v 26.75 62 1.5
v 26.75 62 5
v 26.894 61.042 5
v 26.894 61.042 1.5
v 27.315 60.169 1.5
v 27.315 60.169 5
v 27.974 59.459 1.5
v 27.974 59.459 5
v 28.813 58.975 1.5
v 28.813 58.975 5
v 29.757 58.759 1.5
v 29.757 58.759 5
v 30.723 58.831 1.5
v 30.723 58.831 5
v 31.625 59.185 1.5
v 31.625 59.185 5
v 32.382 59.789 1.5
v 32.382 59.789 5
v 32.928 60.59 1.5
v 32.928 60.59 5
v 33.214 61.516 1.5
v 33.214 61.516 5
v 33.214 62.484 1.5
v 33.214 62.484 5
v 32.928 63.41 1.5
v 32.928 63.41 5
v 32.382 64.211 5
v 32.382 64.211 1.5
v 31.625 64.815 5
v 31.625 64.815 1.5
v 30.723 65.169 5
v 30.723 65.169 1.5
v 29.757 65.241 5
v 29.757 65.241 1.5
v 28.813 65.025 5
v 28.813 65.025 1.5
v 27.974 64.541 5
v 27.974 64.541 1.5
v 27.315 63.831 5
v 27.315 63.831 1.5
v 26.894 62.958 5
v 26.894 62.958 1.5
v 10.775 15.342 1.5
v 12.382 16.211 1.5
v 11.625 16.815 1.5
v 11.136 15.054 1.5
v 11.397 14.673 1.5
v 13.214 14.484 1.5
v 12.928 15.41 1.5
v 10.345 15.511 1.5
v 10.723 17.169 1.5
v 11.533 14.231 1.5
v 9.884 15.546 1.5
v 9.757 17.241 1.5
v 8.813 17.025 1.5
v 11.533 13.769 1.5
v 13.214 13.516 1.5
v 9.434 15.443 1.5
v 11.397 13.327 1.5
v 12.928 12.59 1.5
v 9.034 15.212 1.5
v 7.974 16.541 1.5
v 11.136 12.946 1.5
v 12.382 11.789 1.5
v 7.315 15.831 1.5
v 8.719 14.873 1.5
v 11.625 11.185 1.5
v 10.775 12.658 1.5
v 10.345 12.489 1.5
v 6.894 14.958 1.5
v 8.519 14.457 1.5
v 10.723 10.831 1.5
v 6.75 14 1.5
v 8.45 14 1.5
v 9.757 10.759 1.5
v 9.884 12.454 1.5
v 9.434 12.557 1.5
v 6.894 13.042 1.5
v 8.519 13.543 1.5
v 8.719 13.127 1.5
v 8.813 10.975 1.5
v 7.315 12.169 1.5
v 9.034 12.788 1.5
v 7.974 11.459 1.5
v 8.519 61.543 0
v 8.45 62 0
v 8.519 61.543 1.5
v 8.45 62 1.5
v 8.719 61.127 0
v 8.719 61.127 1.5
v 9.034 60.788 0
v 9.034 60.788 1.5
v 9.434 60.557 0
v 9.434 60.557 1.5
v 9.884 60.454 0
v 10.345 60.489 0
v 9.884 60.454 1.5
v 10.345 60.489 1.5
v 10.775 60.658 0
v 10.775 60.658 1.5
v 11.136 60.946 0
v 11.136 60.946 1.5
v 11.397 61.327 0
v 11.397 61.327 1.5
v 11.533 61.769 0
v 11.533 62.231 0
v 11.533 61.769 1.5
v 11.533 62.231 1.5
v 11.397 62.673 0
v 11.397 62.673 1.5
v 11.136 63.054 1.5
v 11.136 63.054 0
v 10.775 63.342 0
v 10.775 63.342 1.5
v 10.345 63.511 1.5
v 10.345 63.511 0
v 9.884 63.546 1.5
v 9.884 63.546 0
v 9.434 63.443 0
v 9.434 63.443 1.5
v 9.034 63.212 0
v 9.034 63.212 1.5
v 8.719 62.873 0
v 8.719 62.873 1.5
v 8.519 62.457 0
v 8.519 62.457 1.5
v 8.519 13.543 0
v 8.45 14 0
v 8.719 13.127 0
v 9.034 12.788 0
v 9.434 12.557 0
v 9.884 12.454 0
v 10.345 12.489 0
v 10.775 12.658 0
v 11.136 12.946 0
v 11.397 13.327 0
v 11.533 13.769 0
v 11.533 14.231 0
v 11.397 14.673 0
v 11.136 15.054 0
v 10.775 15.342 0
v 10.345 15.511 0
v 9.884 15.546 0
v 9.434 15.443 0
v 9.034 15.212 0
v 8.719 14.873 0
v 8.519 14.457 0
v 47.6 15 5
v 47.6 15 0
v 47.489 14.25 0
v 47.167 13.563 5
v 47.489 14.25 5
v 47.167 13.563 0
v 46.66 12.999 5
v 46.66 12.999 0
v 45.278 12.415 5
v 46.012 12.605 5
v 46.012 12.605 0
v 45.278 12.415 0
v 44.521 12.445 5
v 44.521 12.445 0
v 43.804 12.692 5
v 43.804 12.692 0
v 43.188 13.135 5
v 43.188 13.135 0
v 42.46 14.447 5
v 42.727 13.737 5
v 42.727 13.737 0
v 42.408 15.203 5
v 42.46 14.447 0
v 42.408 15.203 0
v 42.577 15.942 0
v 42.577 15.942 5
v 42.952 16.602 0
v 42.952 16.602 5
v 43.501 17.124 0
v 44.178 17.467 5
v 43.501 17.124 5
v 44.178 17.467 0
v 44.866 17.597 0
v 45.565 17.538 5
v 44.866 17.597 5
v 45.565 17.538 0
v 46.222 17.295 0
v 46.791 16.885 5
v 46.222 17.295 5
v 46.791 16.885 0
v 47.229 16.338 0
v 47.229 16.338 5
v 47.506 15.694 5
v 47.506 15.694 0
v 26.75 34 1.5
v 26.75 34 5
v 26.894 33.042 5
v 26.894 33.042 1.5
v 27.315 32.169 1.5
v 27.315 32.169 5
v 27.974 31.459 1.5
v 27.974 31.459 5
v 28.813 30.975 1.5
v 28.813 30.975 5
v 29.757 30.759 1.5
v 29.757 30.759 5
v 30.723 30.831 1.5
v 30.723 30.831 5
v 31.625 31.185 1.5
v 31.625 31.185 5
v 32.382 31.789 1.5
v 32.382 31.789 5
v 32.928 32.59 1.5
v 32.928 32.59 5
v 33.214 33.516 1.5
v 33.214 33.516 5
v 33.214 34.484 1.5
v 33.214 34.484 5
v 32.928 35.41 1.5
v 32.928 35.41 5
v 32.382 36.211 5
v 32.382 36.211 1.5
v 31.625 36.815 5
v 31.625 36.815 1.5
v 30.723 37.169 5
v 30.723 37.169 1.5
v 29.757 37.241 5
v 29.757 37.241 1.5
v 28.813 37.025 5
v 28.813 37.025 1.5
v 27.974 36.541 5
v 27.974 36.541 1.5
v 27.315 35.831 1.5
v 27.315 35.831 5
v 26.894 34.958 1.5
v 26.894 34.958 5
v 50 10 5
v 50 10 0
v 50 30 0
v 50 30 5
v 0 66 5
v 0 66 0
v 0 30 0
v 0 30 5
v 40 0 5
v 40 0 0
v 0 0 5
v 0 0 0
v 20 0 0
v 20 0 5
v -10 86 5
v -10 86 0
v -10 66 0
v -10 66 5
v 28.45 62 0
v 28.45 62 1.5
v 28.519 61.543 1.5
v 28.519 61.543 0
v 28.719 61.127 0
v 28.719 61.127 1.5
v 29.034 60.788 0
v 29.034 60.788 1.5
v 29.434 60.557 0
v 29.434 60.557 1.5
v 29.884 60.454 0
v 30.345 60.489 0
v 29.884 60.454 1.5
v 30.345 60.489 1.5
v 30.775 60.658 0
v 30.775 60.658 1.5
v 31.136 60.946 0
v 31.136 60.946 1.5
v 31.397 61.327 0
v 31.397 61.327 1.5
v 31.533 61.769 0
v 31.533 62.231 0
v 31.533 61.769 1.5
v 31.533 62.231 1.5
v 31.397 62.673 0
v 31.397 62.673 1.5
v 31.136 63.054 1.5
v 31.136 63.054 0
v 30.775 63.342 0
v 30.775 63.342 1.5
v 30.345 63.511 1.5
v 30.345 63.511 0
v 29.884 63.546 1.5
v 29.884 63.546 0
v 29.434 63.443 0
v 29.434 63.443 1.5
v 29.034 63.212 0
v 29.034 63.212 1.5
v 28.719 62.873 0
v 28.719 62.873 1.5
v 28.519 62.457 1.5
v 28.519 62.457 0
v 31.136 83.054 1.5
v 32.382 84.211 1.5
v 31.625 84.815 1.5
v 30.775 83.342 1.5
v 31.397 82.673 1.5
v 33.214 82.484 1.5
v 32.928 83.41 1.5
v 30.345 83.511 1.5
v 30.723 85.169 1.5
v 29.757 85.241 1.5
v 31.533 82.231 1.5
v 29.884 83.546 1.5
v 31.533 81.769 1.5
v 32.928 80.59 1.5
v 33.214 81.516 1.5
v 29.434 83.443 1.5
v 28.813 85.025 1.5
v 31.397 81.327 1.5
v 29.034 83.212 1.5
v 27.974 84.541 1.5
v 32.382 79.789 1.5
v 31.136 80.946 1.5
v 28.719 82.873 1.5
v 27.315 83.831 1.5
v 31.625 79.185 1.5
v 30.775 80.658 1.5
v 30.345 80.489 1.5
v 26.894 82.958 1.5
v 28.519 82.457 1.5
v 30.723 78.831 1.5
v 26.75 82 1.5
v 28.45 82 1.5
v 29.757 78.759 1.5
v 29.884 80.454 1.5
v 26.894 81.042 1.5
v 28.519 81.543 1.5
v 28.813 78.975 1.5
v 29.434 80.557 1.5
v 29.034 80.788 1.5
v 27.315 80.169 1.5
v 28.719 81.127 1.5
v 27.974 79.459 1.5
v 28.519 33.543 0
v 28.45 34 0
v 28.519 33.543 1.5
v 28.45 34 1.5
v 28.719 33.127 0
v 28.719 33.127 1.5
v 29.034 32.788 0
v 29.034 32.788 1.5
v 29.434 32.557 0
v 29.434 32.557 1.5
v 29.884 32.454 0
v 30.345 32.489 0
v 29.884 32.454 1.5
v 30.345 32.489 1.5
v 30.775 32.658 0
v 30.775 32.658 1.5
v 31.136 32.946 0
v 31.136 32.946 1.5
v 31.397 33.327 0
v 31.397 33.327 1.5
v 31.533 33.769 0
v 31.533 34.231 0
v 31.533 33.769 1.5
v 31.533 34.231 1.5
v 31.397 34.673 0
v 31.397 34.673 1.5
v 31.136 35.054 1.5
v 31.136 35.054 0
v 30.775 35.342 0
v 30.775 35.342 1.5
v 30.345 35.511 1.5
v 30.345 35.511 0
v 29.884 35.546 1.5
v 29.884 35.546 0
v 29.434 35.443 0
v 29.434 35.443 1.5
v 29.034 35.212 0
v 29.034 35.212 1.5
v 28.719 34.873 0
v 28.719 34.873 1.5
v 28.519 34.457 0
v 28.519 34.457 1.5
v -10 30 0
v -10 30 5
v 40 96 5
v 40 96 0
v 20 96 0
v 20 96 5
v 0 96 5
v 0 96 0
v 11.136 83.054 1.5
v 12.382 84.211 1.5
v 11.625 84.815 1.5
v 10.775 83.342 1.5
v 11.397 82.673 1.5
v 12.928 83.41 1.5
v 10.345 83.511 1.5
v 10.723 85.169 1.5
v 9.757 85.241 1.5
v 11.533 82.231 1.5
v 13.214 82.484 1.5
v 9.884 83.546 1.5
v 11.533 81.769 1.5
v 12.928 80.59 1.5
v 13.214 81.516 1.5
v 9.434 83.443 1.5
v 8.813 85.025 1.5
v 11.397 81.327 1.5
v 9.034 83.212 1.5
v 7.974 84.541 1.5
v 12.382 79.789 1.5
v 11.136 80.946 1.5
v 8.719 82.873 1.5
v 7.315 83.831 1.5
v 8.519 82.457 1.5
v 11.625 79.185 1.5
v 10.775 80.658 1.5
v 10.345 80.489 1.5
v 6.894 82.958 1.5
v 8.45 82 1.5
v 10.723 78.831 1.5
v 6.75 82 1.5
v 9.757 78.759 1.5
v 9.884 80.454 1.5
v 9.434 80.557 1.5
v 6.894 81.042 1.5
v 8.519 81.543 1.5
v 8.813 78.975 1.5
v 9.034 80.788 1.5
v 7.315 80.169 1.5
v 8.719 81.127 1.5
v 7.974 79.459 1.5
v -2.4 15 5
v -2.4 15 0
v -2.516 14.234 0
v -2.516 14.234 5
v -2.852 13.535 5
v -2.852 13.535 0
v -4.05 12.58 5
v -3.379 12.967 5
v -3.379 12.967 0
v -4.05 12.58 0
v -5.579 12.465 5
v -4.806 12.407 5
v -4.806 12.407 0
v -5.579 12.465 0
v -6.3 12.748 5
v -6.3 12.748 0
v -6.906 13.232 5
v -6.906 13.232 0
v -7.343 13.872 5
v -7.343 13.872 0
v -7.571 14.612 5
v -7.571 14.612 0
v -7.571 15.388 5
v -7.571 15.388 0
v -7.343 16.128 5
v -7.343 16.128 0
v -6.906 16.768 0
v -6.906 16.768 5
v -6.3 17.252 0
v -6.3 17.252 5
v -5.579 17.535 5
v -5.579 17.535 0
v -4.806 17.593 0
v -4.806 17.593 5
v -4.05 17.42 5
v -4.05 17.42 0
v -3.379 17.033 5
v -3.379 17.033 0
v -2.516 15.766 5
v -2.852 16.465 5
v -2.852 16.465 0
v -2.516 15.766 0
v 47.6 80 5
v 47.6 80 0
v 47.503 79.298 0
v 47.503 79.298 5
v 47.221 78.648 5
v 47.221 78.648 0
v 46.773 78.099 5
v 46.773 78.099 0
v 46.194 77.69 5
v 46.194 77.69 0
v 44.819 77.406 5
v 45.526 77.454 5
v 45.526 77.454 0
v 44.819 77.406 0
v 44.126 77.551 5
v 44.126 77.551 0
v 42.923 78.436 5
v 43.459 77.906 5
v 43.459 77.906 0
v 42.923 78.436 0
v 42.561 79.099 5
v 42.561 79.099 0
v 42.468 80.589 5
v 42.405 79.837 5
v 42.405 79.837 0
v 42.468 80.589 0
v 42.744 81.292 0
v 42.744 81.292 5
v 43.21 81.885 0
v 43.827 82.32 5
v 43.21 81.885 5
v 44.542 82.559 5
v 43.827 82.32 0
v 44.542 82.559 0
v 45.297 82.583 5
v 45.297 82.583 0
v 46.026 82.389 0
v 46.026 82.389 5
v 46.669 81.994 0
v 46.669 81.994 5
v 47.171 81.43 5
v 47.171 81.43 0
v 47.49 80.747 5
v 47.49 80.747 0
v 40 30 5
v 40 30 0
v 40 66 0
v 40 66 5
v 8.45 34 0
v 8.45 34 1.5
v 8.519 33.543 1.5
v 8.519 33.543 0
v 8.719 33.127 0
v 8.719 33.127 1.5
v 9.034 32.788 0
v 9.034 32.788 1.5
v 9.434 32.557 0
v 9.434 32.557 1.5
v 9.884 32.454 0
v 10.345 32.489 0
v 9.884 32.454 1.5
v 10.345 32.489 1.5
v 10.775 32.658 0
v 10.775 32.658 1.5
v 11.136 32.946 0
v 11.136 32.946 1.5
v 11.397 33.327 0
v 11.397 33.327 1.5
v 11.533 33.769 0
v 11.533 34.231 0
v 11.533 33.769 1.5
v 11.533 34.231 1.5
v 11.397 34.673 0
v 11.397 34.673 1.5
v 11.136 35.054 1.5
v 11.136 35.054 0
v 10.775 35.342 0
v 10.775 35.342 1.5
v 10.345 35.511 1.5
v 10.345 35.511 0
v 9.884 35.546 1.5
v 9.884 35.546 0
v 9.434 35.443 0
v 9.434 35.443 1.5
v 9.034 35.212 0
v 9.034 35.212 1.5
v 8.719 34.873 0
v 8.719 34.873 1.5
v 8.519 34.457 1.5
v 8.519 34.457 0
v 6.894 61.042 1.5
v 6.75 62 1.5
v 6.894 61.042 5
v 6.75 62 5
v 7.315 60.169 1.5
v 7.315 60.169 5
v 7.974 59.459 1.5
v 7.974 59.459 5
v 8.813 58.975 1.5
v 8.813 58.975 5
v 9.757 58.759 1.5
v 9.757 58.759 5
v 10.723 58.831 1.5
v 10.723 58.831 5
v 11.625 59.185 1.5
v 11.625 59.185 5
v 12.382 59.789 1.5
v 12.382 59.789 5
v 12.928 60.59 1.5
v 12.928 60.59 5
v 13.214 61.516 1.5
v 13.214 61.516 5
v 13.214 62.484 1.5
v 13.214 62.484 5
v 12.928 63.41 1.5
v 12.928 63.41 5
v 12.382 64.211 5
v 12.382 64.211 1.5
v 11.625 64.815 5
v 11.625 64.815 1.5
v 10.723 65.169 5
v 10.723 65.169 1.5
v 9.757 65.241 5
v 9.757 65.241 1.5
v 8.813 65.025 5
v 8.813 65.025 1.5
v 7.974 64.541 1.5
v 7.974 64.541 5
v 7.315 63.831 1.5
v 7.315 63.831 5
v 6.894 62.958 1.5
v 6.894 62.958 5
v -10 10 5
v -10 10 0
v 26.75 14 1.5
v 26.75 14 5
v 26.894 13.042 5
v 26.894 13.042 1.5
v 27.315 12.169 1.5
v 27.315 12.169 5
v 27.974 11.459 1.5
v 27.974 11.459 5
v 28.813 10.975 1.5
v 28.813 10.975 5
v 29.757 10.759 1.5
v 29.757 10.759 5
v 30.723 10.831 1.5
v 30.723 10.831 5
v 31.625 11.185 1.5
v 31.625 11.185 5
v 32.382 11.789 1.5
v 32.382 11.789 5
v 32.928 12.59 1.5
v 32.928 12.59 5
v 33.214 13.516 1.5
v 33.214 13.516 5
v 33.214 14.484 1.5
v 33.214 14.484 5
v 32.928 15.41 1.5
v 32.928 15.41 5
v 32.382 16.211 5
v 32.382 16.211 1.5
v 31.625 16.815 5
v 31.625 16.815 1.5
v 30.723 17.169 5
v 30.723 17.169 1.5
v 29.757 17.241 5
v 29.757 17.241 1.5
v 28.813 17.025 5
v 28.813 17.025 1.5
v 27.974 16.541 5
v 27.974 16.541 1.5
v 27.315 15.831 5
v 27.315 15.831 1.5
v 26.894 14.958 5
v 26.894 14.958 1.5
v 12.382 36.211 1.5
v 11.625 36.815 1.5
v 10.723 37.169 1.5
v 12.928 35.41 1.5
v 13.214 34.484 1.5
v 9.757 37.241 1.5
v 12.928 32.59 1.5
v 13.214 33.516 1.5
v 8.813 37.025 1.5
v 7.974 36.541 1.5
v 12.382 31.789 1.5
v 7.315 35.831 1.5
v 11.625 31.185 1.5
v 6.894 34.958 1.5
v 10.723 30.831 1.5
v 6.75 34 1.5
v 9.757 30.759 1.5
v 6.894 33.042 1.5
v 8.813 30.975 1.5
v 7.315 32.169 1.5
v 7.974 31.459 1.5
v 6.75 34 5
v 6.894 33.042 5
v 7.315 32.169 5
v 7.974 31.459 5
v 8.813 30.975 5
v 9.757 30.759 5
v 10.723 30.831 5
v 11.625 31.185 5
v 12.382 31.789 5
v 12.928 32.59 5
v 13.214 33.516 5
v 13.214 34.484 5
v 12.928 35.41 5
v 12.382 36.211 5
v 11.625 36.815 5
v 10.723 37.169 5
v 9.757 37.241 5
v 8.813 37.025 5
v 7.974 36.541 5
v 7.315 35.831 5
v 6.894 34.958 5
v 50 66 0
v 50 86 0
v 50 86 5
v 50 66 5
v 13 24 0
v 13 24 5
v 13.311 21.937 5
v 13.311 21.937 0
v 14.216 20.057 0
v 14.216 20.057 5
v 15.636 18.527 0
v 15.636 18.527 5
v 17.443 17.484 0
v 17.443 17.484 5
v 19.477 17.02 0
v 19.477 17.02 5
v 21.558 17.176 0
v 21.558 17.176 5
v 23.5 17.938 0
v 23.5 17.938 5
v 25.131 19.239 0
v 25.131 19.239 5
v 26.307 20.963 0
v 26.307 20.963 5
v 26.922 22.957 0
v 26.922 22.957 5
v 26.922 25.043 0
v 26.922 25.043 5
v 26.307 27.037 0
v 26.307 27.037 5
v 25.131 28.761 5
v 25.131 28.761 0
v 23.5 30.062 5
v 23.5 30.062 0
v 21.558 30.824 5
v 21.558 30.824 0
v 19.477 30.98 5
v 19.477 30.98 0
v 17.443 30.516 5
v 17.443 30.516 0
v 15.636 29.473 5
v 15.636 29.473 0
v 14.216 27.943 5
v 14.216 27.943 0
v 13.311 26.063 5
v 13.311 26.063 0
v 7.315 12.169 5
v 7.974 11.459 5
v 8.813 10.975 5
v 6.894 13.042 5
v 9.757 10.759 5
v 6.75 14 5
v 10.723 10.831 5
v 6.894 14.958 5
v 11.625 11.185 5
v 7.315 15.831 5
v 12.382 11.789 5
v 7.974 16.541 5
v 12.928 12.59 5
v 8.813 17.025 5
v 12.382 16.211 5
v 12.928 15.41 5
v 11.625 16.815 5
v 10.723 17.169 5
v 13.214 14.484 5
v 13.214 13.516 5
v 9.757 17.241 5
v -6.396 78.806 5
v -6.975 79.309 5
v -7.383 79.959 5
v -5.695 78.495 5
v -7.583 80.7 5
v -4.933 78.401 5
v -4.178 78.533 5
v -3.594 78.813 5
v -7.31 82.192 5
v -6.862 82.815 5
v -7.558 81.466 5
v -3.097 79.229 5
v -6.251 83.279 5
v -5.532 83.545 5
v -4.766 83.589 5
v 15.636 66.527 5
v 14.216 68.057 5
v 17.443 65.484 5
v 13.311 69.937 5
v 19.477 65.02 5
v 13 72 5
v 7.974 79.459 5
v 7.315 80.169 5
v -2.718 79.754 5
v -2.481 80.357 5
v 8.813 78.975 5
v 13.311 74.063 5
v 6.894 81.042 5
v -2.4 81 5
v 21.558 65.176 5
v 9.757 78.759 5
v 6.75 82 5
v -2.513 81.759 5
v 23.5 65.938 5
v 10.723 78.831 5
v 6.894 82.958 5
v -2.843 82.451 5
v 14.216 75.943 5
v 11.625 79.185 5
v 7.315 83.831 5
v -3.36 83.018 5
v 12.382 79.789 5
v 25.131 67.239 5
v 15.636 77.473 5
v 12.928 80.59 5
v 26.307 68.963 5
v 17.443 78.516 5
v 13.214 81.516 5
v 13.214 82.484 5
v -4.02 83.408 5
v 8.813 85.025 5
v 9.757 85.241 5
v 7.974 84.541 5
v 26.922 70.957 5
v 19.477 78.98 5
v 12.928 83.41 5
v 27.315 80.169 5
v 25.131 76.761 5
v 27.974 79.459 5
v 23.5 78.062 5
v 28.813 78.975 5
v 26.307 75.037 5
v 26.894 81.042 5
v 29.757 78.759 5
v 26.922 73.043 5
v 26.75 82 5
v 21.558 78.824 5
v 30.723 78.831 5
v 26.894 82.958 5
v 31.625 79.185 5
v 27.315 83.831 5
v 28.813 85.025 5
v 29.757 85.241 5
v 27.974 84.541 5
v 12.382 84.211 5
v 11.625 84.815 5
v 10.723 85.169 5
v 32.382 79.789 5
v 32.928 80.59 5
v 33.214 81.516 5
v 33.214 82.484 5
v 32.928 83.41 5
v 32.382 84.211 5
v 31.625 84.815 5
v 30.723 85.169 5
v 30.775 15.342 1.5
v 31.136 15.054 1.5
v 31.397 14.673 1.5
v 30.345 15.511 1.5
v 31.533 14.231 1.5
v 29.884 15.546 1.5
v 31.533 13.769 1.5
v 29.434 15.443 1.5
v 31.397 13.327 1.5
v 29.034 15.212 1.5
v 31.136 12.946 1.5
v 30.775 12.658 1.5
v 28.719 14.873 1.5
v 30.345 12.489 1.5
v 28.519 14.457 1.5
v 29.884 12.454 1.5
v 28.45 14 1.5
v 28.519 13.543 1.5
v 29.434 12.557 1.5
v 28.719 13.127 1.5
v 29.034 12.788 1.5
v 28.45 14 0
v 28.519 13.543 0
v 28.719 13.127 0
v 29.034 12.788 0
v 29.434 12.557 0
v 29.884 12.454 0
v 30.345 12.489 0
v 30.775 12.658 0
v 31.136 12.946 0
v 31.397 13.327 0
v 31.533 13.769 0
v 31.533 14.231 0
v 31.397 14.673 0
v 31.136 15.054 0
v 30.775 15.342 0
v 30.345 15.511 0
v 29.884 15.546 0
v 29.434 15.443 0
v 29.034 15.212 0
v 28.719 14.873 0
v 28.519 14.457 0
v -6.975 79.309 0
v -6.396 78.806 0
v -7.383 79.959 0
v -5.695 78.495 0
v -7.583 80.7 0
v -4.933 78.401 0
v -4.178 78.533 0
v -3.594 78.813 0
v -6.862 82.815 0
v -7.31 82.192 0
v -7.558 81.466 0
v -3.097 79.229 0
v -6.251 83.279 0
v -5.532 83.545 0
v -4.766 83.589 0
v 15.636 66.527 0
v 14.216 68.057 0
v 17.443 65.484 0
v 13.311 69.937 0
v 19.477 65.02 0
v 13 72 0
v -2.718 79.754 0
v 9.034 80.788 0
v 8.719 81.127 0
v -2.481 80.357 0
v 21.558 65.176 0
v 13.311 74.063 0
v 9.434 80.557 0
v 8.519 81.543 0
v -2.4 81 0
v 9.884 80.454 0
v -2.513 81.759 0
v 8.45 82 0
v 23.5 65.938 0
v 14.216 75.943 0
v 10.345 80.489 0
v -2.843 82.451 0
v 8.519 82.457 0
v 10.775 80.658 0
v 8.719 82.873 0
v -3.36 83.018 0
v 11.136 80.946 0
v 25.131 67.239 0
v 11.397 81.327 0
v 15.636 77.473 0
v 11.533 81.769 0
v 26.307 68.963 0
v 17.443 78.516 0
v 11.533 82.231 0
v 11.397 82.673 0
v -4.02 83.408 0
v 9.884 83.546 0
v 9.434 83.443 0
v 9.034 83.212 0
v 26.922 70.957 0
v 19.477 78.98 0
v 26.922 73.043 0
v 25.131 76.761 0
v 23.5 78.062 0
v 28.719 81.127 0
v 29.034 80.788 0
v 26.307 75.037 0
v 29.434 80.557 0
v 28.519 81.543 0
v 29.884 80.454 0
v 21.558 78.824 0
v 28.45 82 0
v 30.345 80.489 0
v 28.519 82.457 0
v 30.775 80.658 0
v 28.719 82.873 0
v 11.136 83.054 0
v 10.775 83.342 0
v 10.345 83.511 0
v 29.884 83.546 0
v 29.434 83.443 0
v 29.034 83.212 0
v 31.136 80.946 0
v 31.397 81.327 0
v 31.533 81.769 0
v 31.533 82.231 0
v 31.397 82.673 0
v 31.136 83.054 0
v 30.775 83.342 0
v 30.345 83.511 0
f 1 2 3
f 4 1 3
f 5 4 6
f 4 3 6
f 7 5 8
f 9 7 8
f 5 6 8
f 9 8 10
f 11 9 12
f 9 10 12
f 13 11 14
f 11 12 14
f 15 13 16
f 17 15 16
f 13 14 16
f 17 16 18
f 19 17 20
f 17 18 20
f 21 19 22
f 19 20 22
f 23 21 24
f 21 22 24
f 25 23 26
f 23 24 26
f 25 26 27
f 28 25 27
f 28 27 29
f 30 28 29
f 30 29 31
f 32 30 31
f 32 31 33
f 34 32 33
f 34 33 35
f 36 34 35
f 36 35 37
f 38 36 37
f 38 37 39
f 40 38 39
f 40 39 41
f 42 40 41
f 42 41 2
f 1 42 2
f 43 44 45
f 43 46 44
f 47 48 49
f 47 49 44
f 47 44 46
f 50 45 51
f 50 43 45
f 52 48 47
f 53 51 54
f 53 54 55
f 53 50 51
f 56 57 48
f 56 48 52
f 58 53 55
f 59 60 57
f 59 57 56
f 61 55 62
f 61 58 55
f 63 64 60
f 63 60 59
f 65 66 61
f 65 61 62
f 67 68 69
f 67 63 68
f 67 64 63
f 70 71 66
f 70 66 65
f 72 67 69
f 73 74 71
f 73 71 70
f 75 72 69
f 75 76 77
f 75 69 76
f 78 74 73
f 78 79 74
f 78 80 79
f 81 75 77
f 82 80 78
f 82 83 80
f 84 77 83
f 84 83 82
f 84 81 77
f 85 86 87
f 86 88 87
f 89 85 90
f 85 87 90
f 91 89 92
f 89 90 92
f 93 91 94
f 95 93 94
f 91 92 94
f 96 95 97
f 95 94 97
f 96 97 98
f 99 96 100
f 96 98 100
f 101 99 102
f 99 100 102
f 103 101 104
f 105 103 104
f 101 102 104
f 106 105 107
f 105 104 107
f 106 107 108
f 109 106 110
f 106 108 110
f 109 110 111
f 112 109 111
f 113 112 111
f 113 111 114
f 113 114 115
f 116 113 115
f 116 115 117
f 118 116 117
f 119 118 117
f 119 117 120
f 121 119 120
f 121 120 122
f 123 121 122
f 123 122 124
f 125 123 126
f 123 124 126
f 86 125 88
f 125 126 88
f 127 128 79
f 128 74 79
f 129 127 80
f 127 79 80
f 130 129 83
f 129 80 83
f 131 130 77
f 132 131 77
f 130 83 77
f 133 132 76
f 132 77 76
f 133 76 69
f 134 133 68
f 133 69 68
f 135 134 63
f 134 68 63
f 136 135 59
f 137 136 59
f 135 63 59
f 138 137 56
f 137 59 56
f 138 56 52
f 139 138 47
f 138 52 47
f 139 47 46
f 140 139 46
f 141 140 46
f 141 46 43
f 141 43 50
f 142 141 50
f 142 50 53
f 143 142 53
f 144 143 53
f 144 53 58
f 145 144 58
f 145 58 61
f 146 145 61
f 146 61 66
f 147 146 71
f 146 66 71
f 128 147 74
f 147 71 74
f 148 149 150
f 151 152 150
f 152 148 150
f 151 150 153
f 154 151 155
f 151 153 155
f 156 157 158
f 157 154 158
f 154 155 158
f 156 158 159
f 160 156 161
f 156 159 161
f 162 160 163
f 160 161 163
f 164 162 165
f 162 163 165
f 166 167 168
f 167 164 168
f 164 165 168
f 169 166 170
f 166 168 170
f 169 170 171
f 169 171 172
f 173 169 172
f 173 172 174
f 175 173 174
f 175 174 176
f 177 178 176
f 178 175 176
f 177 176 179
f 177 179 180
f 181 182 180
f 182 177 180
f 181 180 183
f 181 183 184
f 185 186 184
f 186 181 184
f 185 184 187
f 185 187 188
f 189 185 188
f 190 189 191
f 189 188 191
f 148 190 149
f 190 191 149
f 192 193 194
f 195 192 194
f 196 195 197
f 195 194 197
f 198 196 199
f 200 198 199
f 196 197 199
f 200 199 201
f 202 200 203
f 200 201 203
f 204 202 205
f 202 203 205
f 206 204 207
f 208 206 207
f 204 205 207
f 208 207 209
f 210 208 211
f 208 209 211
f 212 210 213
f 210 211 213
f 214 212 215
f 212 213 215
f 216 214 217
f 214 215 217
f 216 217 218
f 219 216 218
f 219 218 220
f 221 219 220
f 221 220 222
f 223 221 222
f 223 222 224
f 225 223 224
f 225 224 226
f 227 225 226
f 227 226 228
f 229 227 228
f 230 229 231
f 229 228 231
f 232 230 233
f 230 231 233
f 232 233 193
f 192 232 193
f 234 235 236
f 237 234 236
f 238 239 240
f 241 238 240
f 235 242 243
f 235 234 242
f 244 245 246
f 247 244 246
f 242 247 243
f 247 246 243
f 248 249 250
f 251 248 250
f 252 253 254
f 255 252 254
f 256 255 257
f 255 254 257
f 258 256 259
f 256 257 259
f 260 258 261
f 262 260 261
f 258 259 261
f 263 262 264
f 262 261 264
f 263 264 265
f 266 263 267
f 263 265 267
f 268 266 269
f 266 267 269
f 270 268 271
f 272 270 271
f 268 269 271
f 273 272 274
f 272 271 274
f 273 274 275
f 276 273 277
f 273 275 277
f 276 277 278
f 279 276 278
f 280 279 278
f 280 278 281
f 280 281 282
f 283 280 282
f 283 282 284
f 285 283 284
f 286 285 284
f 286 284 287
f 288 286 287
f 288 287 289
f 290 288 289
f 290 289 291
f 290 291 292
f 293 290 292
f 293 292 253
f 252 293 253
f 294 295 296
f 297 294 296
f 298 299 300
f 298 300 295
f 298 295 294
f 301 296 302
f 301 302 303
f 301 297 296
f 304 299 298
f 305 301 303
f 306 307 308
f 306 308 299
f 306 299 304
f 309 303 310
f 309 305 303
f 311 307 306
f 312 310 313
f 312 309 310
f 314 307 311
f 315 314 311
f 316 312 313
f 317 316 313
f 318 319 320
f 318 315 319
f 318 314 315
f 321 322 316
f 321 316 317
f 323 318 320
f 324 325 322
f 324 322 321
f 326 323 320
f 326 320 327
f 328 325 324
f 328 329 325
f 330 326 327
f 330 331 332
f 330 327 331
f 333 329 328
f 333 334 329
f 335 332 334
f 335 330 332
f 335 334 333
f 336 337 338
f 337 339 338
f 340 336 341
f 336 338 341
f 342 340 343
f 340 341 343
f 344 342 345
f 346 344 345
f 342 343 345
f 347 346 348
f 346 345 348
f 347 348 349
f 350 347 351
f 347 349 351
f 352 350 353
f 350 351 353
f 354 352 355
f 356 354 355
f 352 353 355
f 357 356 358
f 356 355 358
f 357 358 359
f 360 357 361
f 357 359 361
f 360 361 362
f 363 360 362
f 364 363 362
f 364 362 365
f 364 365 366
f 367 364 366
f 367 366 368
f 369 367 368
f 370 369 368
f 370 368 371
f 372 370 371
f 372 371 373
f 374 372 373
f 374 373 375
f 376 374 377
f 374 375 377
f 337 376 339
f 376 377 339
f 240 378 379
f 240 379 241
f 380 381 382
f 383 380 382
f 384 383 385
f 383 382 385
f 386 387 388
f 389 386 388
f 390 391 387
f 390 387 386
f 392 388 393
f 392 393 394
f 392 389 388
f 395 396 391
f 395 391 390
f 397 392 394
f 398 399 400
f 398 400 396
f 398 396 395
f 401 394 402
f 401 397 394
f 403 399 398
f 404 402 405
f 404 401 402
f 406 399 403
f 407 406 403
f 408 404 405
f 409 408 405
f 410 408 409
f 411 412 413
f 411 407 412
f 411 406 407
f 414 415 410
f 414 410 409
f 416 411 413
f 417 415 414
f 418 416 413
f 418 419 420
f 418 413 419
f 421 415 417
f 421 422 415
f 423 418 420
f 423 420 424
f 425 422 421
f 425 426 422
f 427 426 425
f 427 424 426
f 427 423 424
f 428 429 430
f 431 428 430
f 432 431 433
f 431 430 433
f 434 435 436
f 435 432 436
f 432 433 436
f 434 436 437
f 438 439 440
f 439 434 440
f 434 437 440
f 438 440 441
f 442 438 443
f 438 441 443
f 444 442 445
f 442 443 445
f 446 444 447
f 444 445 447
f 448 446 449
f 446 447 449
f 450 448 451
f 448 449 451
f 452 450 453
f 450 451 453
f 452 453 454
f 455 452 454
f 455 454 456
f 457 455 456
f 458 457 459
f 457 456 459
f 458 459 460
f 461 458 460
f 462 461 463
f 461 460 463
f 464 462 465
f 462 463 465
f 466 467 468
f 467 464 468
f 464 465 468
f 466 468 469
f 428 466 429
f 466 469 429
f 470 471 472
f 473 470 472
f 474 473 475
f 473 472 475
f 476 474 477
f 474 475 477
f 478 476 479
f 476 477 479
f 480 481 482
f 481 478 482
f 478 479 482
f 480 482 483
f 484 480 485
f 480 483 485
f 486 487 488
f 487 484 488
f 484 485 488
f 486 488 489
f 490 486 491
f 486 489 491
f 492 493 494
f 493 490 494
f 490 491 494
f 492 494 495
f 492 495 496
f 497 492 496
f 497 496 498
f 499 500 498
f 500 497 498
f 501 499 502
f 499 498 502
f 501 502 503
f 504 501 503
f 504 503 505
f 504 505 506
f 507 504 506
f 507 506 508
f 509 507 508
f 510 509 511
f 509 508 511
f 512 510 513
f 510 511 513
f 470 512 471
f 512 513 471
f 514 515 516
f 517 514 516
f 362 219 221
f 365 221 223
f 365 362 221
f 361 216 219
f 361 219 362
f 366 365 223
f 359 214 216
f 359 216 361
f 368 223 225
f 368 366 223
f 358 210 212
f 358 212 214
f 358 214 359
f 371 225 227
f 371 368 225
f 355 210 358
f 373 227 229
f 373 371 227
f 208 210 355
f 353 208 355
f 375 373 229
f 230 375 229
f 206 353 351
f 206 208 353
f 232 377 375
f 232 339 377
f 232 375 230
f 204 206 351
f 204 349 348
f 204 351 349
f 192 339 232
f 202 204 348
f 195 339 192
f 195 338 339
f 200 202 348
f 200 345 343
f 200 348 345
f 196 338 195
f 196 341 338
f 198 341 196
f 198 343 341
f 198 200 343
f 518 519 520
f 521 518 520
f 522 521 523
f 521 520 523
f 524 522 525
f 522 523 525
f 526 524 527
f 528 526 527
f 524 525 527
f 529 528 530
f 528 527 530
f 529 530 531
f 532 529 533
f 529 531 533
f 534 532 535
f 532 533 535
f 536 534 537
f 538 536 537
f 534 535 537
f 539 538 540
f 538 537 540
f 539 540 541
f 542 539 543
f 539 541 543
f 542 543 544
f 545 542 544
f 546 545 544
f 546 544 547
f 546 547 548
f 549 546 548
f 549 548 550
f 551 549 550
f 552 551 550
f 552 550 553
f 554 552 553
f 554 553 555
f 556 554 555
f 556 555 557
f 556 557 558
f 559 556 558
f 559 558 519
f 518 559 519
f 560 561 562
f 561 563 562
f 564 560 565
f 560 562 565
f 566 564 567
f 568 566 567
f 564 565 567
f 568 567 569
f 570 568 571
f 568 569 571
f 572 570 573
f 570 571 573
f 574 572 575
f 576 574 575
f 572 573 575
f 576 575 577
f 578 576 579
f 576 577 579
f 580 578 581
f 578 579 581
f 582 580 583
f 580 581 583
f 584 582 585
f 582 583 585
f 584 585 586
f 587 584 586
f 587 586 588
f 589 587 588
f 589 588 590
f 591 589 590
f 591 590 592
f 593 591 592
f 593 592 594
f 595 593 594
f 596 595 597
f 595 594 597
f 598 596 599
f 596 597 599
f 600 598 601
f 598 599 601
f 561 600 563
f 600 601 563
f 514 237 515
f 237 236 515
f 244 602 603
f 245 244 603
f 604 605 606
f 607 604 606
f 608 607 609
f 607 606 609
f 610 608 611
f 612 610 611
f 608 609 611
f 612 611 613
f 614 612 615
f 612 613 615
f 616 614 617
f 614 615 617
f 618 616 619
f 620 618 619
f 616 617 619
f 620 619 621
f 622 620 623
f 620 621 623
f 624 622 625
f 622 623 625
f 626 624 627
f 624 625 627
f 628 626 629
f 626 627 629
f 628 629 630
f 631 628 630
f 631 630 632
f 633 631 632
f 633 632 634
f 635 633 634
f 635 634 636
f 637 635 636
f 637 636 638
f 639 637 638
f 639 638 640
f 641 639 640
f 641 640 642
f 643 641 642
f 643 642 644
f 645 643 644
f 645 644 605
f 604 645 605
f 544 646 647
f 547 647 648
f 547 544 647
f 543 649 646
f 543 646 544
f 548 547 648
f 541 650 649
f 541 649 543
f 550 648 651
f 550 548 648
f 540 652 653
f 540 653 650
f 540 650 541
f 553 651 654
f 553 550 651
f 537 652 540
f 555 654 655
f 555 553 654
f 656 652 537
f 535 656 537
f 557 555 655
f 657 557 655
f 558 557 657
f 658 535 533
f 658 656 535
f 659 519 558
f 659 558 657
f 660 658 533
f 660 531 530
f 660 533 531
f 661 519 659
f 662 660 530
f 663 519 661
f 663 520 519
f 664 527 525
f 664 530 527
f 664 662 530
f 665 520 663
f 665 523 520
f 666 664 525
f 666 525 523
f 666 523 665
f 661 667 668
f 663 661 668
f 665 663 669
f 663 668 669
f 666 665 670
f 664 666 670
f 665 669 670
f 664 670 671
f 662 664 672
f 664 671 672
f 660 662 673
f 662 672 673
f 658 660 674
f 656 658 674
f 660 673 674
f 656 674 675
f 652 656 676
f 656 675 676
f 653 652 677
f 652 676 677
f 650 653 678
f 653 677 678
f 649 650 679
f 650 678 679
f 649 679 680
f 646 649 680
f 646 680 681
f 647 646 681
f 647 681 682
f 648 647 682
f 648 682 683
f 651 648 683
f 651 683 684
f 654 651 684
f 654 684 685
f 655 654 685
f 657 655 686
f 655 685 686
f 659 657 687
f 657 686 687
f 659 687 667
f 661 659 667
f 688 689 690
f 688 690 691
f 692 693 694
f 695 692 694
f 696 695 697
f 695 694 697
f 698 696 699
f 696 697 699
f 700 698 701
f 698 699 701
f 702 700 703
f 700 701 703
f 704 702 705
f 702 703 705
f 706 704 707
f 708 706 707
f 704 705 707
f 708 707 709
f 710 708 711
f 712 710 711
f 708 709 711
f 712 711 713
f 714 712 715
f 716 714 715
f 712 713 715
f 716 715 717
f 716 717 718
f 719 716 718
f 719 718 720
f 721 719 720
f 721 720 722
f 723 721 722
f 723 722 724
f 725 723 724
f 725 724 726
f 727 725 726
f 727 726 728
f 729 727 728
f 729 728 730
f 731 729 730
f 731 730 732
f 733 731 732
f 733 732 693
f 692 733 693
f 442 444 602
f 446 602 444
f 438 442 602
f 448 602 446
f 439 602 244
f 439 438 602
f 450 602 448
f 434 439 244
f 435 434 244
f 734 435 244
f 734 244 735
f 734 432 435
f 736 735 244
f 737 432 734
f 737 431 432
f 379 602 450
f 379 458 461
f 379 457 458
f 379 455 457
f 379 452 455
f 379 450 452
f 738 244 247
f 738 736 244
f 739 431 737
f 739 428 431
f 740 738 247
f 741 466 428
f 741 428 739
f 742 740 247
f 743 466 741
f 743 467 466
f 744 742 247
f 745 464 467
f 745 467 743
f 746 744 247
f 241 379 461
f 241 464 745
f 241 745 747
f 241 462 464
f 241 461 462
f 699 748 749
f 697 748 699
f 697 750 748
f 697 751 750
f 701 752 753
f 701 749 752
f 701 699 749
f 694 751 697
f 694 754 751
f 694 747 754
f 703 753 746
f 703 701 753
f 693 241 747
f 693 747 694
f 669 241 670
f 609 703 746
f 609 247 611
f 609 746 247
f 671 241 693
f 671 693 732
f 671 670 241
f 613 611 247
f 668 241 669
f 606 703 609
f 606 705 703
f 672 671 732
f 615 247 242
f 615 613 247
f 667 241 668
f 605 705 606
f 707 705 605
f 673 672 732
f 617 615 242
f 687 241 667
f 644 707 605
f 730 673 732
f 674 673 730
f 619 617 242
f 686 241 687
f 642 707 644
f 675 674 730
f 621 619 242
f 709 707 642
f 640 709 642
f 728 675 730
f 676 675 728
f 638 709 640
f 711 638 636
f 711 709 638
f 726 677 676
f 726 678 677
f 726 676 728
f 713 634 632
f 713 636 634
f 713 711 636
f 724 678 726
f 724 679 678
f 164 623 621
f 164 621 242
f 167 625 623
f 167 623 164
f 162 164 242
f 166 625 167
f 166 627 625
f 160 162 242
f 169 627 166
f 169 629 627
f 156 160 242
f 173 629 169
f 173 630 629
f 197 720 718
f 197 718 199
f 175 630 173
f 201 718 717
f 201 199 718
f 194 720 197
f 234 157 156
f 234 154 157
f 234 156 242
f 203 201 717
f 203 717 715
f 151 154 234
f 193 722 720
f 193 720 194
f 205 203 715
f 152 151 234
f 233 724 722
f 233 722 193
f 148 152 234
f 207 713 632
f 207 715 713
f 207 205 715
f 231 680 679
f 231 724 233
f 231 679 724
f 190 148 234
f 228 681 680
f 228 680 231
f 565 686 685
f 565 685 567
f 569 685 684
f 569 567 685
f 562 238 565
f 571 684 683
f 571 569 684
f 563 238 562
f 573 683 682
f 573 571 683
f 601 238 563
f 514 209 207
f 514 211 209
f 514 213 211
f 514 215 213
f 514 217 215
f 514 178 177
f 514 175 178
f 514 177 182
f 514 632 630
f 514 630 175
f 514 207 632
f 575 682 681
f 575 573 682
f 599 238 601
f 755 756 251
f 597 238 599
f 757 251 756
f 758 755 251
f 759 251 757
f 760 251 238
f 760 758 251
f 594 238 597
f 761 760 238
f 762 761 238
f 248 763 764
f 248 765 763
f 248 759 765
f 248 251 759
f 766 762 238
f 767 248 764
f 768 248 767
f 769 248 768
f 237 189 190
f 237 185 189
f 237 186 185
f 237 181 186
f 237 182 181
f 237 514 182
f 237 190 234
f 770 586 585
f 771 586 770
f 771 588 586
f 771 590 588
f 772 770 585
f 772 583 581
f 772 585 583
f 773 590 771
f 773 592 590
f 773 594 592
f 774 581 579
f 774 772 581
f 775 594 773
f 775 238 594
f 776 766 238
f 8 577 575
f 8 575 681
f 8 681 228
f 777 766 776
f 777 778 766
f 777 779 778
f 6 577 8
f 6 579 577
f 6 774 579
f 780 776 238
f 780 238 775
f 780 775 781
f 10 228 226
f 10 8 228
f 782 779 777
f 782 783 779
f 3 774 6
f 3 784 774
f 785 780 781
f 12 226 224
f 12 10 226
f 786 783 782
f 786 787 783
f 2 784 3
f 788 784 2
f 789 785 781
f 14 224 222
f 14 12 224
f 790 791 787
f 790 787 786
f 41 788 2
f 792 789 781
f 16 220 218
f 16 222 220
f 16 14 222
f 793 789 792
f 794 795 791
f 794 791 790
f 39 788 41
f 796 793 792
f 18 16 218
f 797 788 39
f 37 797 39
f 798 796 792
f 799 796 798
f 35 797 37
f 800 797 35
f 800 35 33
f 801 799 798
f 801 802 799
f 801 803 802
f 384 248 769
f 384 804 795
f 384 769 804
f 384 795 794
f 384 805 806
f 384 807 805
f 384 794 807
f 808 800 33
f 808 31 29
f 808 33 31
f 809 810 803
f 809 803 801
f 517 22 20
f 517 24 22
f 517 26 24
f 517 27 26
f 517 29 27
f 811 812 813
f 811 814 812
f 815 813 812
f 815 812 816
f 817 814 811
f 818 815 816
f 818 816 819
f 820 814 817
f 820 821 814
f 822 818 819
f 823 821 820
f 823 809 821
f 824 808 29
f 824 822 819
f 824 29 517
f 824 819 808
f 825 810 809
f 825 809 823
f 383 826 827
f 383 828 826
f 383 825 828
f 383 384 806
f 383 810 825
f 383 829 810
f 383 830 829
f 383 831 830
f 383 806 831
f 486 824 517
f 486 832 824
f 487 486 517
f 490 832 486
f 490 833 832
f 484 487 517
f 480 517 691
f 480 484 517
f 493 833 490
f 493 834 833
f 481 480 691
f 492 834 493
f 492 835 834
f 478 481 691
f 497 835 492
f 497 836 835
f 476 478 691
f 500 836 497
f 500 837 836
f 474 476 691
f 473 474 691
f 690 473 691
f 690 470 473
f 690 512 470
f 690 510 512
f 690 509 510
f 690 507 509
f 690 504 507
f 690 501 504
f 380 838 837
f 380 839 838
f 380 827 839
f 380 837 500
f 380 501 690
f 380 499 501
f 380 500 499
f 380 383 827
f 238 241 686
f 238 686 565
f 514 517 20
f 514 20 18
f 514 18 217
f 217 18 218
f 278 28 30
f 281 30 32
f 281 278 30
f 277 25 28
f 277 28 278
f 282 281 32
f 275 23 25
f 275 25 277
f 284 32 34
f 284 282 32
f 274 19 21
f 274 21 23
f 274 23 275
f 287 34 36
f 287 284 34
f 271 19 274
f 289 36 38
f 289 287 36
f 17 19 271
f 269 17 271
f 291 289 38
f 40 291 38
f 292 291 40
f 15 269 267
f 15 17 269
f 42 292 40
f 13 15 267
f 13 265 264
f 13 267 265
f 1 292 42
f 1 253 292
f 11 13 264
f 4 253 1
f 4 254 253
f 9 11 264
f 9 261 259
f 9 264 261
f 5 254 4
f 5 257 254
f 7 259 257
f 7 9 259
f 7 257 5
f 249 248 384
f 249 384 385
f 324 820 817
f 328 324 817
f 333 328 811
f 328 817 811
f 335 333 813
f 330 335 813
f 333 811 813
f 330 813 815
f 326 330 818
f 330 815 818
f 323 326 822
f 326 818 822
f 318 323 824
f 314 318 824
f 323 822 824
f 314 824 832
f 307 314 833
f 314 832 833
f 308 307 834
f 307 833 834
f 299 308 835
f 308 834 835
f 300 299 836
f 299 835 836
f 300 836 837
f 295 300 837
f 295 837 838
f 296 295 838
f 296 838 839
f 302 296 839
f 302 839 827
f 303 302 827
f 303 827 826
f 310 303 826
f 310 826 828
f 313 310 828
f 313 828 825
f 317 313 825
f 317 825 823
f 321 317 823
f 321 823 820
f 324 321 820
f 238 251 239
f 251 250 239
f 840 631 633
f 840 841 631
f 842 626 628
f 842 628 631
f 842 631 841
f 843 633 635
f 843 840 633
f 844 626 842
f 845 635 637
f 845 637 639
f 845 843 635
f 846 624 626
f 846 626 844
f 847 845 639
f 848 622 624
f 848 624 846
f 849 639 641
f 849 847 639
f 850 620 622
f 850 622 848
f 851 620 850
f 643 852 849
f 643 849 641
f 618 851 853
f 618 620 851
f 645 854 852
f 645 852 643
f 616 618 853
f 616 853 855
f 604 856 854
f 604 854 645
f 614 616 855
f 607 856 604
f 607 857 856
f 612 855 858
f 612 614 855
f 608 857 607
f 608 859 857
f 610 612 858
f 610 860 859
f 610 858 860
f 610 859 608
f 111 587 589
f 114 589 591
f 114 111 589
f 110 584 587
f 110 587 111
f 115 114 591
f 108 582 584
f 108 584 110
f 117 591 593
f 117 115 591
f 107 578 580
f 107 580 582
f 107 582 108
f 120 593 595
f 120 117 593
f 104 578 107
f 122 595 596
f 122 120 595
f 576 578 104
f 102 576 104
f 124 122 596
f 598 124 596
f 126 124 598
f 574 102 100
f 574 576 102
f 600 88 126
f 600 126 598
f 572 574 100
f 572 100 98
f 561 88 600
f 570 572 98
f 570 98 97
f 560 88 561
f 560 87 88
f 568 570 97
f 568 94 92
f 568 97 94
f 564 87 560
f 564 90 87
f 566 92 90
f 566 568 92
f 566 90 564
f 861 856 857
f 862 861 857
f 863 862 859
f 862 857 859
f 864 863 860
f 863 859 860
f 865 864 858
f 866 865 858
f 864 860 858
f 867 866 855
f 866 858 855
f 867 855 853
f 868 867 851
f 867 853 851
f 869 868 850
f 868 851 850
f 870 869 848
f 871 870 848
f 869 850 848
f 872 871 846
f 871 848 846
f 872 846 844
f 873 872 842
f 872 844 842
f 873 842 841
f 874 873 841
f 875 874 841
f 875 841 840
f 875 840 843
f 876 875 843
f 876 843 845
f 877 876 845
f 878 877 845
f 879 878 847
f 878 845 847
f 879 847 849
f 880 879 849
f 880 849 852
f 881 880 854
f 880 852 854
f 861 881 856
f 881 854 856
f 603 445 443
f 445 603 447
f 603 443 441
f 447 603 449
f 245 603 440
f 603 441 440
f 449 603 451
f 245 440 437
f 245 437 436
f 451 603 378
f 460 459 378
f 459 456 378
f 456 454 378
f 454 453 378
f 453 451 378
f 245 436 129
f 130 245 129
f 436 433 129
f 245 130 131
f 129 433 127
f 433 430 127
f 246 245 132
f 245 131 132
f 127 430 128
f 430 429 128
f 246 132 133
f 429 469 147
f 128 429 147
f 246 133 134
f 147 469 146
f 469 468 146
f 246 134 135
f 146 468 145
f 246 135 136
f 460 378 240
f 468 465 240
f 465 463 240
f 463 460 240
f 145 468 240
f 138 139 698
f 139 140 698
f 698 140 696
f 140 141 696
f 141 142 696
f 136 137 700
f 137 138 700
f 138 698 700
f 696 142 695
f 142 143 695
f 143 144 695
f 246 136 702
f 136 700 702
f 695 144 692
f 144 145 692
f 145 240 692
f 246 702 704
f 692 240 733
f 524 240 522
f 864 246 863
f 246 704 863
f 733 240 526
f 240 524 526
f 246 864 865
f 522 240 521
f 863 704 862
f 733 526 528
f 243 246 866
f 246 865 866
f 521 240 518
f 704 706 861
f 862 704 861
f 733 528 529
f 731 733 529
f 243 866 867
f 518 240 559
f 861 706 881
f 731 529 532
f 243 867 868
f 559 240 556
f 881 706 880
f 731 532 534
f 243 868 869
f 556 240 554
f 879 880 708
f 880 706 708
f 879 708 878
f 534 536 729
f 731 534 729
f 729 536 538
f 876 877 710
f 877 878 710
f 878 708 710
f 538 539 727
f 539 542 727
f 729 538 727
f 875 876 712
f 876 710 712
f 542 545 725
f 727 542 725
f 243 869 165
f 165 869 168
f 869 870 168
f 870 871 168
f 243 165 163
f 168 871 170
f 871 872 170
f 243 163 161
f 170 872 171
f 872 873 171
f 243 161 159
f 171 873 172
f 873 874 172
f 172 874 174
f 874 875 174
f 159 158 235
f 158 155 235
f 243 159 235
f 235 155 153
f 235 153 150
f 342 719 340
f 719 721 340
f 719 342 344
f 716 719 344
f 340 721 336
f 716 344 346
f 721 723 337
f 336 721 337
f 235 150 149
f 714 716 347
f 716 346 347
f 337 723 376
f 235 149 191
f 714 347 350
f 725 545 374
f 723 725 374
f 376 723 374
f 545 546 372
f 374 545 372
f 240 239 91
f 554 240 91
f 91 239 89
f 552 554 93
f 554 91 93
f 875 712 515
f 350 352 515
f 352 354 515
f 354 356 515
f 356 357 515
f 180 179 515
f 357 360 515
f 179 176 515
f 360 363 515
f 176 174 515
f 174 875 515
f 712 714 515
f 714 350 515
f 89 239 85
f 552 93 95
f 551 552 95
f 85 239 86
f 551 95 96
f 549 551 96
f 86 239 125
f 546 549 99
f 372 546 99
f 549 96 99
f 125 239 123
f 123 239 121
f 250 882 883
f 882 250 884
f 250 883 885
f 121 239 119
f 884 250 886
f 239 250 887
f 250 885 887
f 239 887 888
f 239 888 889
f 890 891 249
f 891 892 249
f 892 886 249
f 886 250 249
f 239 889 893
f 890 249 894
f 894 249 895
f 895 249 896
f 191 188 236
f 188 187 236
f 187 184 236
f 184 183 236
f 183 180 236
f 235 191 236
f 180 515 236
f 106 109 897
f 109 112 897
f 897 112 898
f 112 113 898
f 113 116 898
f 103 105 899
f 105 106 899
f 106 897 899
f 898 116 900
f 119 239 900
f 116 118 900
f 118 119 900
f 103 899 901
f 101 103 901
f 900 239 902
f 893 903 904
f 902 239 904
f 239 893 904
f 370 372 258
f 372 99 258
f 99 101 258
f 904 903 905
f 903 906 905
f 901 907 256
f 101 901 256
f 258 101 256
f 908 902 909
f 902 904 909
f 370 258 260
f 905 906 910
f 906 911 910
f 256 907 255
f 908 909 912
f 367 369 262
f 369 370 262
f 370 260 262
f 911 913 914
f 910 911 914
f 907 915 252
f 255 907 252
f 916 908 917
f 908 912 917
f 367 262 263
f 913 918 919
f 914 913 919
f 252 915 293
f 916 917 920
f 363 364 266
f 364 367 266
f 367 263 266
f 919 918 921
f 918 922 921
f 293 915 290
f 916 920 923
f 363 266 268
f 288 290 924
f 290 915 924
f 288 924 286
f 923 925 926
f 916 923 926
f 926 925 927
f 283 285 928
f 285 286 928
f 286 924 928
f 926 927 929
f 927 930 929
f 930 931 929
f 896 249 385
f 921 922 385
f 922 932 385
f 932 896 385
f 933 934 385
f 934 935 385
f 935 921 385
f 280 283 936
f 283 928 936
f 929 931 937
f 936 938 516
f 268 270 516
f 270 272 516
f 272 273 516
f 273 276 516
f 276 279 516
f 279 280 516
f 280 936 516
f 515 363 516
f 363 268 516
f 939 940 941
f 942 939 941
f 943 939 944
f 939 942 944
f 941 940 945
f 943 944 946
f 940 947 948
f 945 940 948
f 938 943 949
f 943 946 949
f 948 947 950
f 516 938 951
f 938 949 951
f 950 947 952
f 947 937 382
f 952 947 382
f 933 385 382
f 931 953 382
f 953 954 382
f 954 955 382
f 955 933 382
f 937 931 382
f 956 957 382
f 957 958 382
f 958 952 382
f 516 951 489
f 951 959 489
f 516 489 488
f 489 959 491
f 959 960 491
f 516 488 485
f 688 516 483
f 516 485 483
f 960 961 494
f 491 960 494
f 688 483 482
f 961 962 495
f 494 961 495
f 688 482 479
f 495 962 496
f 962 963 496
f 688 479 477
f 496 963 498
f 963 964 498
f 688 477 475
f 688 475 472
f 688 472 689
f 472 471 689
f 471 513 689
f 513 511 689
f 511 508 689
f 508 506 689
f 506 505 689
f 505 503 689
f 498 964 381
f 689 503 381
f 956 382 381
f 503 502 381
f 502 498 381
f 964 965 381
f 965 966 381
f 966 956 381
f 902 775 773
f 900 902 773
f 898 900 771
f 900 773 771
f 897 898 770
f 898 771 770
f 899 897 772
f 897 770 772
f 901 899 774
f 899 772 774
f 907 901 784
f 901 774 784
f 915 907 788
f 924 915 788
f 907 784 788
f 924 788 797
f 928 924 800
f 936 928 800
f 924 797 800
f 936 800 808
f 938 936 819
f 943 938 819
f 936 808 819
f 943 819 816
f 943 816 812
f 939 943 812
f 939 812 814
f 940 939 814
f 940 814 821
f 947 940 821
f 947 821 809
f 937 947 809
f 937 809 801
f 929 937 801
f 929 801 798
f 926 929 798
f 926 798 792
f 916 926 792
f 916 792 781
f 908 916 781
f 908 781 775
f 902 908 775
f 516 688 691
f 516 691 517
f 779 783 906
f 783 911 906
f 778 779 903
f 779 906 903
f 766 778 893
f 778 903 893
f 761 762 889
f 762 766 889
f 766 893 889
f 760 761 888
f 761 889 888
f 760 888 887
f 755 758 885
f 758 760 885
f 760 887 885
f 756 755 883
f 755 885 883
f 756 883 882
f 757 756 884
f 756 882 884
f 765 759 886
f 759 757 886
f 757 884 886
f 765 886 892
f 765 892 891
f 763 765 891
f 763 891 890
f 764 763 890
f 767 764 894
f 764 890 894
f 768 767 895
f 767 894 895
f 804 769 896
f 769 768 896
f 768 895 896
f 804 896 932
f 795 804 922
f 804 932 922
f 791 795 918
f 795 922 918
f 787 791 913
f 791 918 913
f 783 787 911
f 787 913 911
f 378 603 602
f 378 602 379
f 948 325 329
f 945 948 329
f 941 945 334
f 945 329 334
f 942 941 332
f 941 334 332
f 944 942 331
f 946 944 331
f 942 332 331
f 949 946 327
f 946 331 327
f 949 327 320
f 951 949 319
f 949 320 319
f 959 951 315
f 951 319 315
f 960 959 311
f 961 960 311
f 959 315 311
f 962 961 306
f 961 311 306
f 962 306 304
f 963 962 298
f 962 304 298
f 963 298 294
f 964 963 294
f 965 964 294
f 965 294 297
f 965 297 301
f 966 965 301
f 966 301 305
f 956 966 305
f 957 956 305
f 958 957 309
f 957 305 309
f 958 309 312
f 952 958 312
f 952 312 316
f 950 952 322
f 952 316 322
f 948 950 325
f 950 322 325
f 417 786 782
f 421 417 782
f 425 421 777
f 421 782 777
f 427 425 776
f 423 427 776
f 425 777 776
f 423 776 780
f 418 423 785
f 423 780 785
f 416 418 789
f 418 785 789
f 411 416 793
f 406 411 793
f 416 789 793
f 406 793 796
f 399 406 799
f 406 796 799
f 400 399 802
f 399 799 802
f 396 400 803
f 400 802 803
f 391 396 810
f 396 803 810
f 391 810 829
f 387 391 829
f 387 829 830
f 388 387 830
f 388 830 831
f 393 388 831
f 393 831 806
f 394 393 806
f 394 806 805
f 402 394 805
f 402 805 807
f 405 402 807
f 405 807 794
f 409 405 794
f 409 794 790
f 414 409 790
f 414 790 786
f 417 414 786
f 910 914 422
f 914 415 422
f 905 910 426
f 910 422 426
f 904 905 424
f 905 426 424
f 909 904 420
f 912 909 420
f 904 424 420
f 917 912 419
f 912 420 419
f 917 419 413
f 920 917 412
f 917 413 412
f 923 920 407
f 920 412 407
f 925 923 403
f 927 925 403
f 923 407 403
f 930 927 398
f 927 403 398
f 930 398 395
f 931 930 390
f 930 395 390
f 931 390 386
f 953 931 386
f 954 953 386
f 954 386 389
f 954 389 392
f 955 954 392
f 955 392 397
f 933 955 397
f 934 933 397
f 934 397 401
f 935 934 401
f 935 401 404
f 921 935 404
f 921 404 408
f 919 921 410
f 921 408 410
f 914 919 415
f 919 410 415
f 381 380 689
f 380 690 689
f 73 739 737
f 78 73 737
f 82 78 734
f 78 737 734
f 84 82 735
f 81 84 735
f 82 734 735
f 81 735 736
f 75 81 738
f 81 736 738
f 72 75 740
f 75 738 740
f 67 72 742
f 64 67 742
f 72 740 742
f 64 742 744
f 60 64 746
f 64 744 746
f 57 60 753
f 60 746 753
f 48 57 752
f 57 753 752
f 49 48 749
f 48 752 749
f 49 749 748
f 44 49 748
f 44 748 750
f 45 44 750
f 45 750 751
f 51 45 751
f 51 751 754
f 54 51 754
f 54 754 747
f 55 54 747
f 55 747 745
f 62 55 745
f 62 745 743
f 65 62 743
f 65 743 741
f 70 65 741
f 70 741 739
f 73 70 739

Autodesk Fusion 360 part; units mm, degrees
sketch "Sketch1" plane through (0, 0, 0) normal (0, 0, 1) x (1, 0, 0)
  line L0 (0, 0) -> (40, 0)
  line L1 (40, 0) -> (40, 96)
  line L2 (40, 96) -> (0, 96)
  line L3 (0, 96) -> (0, 0)
  line L4 (20, 0) -> (20, 15)
  line L5 (20, 96) -> (20, 81)
  circle A0 centre (20, 81) radius 2.65
  circle A1 centre (20, 15) radius 2.65
  dimension "d1" = 40
  dimension "d2" = 96
  dimension "d3" = 15
  dimension "d4" = 5.3
  dimension "d5" = 5.3
extrude "Extrude1" add sketch "Sketch1" along normal blind 5
sketch "Sketch2" plane through (0, 0, 5) normal (0, 0, 1) x (-1, 0, 0)
  circle A0 centre (-20, -15) radius 2.65
  circle A1 centre (-20, -81) radius 2.65
  line L0 (0, -96) -> (0, 0)
  line L1 (0, 0) -> (-40, 0)
  line L2 (-40, 0) -> (-40, -96)
  line L3 (-40, -96) -> (0, -96)
  line L4 (0, -48) -> (-40, -48)
  line L5 (-20, -46.5) -> (-20, -1.5)
  line L6 (-20, -34) -> (-30, -34)
  line L7 (-30, -34) -> (-30, -14)
  line L8 (-30, -14) -> (-10, -14)
  line L9 (-10, -14) -> (-10, -34)
  line L10 (-10, -34) -> (-20, -34)
  line L11 (-20, -49.5) -> (-20, -94.5)
  line L12 (-20, -62) -> (-30, -62)
  line L13 (-30, -62) -> (-30, -82)
  line L14 (-30, -82) -> (-10, -82)
  line L15 (-10, -82) -> (-10, -62)
  line L16 (-10, -62) -> (-20, -62)
  circle A2 centre (-30, -14) radius 1.55
  circle A3 centre (-10, -14) radius 1.55
  circle A4 centre (-10, -34) radius 1.55
  circle A5 centre (-30, -34) radius 1.55
  circle A6 centre (-30, -62) radius 1.55
  circle A7 centre (-10, -62) radius 1.55
  circle A8 centre (-10, -82) radius 1.55
  circle A9 centre (-30, -82) radius 1.55
  dimension "d12" = 45
  dimension "d15" = 45
  dimension "d16" = 3.1
  dimension "d17" = 3.1
  dimension "d18" = 3.1
  dimension "d19" = 3.1
  dimension "d20" = 3.1
  dimension "d21" = 3.1
  dimension "d22" = 3.1
  dimension "d23" = 3.1
extrude "Extrude2" cut sketch "Sketch2" against normal blind 5 contours L8 L9 A3 | L8 L9 A3 | L7 L8 A2 | L7 L8 A2 | L6 L7 A5 | L6 L7 A5 | L9 L10 A4 | L9 L10 A4 | L14 L15 A8 | L14 L15 A8 | L13 L14 A9 | L13 L14 A9 | L12 L13 A6 | L12 L13 A6 | L15 L16 A7 | L15 L16 A7
sketch "Sketch3" plane through (0, 0, 5) normal (0, 0, 1) x (-1, 0, 0)
  circle A0 centre (-30, -34) radius 1.55
  circle A1 centre (-10, -82) radius 1.55
  circle A2 centre (-10, -62) radius 1.55
  circle A3 centre (-30, -14) radius 1.55
  circle A4 centre (-10, -34) radius 1.55
  circle A5 centre (-30, -82) radius 1.55
  circle A6 centre (-10, -14) radius 1.55
  circle A7 centre (-30, -62) radius 1.55
  circle A8 centre (-20, -15) radius 2.65
  circle A9 centre (-20, -81) radius 2.65
  line L0 (0, -96) -> (0, 0)
  line L1 (0, 0) -> (-40, 0)
  line L2 (-40, 0) -> (-40, -96)
  line L3 (-40, -96) -> (0, -96)
  circle A10 centre (-20, -15) radius 2.65
  circle A11 centre (-20, -81) radius 2.65
extrude "Extrude3" add sketch "Sketch3" against normal blind 5 contours A8 A10 | A9 A11
sketch "Sketch4" plane through (0, 0, 0) normal (0, 0, 1) x (1, 0, 0)
  line L0 (-10, 0) -> (-10, 30)
  line L1 (-10, 30) -> (0, 30)
  line L2 (-5, 0) -> (-5, 15)
  circle A0 centre (-5, 15) radius 2.6
  line L3 (40, 0) -> (50, 0)
  line L4 (50, 0) -> (50, 30)
  line L5 (50, 30) -> (40, 30)
  line L6 (40, 30) -> (45, 15)
  circle A1 centre (45, 15) radius 2.6
  line L7 (40, 96) -> (50, 96)
  line L8 (50, 96) -> (50, 66)
  line L9 (50, 66) -> (40, 66)
  line L10 (40, 66) -> (45, 80)
  circle A2 centre (45, 80) radius 2.6
  line L11 (0, 96) -> (-10, 96)
  line L12 (-10, 96) -> (-10, 66)
  line L13 (-10, 66) -> (0, 66)
  line L14 (0, 66) -> (-5, 81)
  circle A3 centre (-5, 81) radius 2.6
  line L15 (-10, 0) -> (-9, 0)
  line L16 (-9, 0) -> (0, 0)
  line L17 (0, 0) -> (0, 30)
  line L18 (40, 30) -> (40, 0)
  line L19 (0, 66) -> (0, 96)
  line L20 (40, 96) -> (40, 66)
  dimension "d28" = 5.2
  dimension "d29" = 5.2
  dimension "d30" = 5.2
  dimension "d31" = 5.2
extrude "Extrude4" add sketch "Sketch4" along normal blind 5
chamfer "Chamfer1" distance 10 angle 45 1 edges at (-10, 0, 2.5)
chamfer "Chamfer2" distance 10 angle 45 1 edges at (50, 0, 2.5)
chamfer "Chamfer3" distance 10 angle 45 1 edges at (-10, 96, 2.5)
chamfer "Chamfer4" distance 10 angle 45 1 edges at (50, 96, 2.5)
sketch "Sketch5" plane through (0, 0, 5) normal (0, 0, 1) x (-1, 0, 0)
  circle A0 centre (-45, -80) radius 2.6
  circle A1 centre (-45, -15) radius 2.6
  circle A2 centre (5, -81) radius 2.6
  circle A3 centre (5, -15) radius 2.6
  circle A4 centre (-30, -34) radius 1.55
  circle A5 centre (-10, -82) radius 1.55
  circle A6 centre (-10, -62) radius 1.55
  circle A7 centre (-30, -14) radius 1.55
  circle A8 centre (-10, -34) radius 1.55
  circle A9 centre (-30, -82) radius 1.55
  circle A10 centre (-10, -14) radius 1.55
  circle A11 centre (-30, -62) radius 1.55
  line L0 (-50, -86) -> (-40, -96)
  line L1 (-40, -96) -> (0, -96)
  line L2 (0, -96) -> (10, -86)
  line L3 (10, -86) -> (10, -66)
  line L4 (10, -66) -> (0, -66)
  line L5 (0, -66) -> (0, -30)
  line L6 (0, -30) -> (10, -30)
  line L7 (10, -30) -> (10, -10)
  line L8 (10, -10) -> (0, 0)
  line L9 (0, 0) -> (-40, 0)
  line L10 (-40, 0) -> (-50, -10)
  line L11 (-50, -10) -> (-50, -30)
  line L12 (-50, -30) -> (-40, -30)
  line L13 (-40, -30) -> (-40, -66)
  line L14 (-40, -66) -> (-50, -66)
  line L15 (-50, -66) -> (-50, -86)
  line L16 (-10, -62) -> (-30, -82)
  line L17 (-10, -14) -> (-30, -34)
  circle A12 centre (-20, -24) radius 7
  circle A13 centre (-20, -72) radius 7
  dimension "d38" = 14
  dimension "d39" = 14
extrude "Extrude5" cut sketch "Sketch5" against normal blind 5 contours L17 A12 | L17 A12 | L16 A13 | L16 A13
sketch "Sketch6" plane through (0, 0, 5) normal (0, 0, 1) x (-1, 0, 0)
  circle A0 centre (-20, -24) radius 7
  circle A1 centre (-20, -72) radius 7
  circle A2 centre (-45, -80) radius 2.6
  circle A3 centre (-45, -15) radius 2.6
  circle A4 centre (5, -81) radius 2.6
  circle A5 centre (5, -15) radius 2.6
  circle A6 centre (-30, -34) radius 1.55
  circle A7 centre (-10, -82) radius 1.55
  circle A8 centre (-10, -62) radius 1.55
  circle A9 centre (-30, -14) radius 1.55
  circle A10 centre (-10, -34) radius 1.55
  circle A11 centre (-30, -82) radius 1.55
  circle A12 centre (-10, -14) radius 1.55
  circle A13 centre (-30, -62) radius 1.55
  line L0 (-50, -86) -> (-40, -96)
  line L1 (-40, -96) -> (0, -96)
  line L2 (0, -96) -> (10, -86)
  line L3 (10, -86) -> (10, -66)
  line L4 (10, -66) -> (0, -66)
  line L5 (0, -66) -> (0, -30)
  line L6 (0, -30) -> (10, -30)
  line L7 (10, -30) -> (10, -10)
  line L8 (10, -10) -> (0, 0)
  line L9 (0, 0) -> (-40, 0)
  line L10 (-40, 0) -> (-50, -10)
  line L11 (-50, -10) -> (-50, -30)
  line L12 (-50, -30) -> (-40, -30)
  line L13 (-40, -30) -> (-40, -66)
  line L14 (-40, -66) -> (-50, -66)
  line L15 (-50, -66) -> (-50, -86)
  circle A14 centre (-10, -82) radius 3.25
  circle A15 centre (-30, -82) radius 3.25
  circle A16 centre (-30, -62) radius 3.25
  circle A17 centre (-10, -62) radius 3.25
  circle A18 centre (-10, -34) radius 3.25
  circle A19 centre (-30, -34) radius 3.25
  circle A20 centre (-30, -14) radius 3.25
  circle A21 centre (-10, -14) radius 3.25
  dimension "d42" = 6.5
  dimension "d43" = 6.5
  dimension "d44" = 6.5
  dimension "d45" = 6.5
  dimension "d46" = 6.5
  dimension "d47" = 6.5
  dimension "d48" = 6.5
  dimension "d49" = 6.5
extrude "Extrude6" cut sketch "Sketch6" against normal blind 3.5 contours A14 | A15 | A16 | A17 | A18 | A19 | A20 | A21
